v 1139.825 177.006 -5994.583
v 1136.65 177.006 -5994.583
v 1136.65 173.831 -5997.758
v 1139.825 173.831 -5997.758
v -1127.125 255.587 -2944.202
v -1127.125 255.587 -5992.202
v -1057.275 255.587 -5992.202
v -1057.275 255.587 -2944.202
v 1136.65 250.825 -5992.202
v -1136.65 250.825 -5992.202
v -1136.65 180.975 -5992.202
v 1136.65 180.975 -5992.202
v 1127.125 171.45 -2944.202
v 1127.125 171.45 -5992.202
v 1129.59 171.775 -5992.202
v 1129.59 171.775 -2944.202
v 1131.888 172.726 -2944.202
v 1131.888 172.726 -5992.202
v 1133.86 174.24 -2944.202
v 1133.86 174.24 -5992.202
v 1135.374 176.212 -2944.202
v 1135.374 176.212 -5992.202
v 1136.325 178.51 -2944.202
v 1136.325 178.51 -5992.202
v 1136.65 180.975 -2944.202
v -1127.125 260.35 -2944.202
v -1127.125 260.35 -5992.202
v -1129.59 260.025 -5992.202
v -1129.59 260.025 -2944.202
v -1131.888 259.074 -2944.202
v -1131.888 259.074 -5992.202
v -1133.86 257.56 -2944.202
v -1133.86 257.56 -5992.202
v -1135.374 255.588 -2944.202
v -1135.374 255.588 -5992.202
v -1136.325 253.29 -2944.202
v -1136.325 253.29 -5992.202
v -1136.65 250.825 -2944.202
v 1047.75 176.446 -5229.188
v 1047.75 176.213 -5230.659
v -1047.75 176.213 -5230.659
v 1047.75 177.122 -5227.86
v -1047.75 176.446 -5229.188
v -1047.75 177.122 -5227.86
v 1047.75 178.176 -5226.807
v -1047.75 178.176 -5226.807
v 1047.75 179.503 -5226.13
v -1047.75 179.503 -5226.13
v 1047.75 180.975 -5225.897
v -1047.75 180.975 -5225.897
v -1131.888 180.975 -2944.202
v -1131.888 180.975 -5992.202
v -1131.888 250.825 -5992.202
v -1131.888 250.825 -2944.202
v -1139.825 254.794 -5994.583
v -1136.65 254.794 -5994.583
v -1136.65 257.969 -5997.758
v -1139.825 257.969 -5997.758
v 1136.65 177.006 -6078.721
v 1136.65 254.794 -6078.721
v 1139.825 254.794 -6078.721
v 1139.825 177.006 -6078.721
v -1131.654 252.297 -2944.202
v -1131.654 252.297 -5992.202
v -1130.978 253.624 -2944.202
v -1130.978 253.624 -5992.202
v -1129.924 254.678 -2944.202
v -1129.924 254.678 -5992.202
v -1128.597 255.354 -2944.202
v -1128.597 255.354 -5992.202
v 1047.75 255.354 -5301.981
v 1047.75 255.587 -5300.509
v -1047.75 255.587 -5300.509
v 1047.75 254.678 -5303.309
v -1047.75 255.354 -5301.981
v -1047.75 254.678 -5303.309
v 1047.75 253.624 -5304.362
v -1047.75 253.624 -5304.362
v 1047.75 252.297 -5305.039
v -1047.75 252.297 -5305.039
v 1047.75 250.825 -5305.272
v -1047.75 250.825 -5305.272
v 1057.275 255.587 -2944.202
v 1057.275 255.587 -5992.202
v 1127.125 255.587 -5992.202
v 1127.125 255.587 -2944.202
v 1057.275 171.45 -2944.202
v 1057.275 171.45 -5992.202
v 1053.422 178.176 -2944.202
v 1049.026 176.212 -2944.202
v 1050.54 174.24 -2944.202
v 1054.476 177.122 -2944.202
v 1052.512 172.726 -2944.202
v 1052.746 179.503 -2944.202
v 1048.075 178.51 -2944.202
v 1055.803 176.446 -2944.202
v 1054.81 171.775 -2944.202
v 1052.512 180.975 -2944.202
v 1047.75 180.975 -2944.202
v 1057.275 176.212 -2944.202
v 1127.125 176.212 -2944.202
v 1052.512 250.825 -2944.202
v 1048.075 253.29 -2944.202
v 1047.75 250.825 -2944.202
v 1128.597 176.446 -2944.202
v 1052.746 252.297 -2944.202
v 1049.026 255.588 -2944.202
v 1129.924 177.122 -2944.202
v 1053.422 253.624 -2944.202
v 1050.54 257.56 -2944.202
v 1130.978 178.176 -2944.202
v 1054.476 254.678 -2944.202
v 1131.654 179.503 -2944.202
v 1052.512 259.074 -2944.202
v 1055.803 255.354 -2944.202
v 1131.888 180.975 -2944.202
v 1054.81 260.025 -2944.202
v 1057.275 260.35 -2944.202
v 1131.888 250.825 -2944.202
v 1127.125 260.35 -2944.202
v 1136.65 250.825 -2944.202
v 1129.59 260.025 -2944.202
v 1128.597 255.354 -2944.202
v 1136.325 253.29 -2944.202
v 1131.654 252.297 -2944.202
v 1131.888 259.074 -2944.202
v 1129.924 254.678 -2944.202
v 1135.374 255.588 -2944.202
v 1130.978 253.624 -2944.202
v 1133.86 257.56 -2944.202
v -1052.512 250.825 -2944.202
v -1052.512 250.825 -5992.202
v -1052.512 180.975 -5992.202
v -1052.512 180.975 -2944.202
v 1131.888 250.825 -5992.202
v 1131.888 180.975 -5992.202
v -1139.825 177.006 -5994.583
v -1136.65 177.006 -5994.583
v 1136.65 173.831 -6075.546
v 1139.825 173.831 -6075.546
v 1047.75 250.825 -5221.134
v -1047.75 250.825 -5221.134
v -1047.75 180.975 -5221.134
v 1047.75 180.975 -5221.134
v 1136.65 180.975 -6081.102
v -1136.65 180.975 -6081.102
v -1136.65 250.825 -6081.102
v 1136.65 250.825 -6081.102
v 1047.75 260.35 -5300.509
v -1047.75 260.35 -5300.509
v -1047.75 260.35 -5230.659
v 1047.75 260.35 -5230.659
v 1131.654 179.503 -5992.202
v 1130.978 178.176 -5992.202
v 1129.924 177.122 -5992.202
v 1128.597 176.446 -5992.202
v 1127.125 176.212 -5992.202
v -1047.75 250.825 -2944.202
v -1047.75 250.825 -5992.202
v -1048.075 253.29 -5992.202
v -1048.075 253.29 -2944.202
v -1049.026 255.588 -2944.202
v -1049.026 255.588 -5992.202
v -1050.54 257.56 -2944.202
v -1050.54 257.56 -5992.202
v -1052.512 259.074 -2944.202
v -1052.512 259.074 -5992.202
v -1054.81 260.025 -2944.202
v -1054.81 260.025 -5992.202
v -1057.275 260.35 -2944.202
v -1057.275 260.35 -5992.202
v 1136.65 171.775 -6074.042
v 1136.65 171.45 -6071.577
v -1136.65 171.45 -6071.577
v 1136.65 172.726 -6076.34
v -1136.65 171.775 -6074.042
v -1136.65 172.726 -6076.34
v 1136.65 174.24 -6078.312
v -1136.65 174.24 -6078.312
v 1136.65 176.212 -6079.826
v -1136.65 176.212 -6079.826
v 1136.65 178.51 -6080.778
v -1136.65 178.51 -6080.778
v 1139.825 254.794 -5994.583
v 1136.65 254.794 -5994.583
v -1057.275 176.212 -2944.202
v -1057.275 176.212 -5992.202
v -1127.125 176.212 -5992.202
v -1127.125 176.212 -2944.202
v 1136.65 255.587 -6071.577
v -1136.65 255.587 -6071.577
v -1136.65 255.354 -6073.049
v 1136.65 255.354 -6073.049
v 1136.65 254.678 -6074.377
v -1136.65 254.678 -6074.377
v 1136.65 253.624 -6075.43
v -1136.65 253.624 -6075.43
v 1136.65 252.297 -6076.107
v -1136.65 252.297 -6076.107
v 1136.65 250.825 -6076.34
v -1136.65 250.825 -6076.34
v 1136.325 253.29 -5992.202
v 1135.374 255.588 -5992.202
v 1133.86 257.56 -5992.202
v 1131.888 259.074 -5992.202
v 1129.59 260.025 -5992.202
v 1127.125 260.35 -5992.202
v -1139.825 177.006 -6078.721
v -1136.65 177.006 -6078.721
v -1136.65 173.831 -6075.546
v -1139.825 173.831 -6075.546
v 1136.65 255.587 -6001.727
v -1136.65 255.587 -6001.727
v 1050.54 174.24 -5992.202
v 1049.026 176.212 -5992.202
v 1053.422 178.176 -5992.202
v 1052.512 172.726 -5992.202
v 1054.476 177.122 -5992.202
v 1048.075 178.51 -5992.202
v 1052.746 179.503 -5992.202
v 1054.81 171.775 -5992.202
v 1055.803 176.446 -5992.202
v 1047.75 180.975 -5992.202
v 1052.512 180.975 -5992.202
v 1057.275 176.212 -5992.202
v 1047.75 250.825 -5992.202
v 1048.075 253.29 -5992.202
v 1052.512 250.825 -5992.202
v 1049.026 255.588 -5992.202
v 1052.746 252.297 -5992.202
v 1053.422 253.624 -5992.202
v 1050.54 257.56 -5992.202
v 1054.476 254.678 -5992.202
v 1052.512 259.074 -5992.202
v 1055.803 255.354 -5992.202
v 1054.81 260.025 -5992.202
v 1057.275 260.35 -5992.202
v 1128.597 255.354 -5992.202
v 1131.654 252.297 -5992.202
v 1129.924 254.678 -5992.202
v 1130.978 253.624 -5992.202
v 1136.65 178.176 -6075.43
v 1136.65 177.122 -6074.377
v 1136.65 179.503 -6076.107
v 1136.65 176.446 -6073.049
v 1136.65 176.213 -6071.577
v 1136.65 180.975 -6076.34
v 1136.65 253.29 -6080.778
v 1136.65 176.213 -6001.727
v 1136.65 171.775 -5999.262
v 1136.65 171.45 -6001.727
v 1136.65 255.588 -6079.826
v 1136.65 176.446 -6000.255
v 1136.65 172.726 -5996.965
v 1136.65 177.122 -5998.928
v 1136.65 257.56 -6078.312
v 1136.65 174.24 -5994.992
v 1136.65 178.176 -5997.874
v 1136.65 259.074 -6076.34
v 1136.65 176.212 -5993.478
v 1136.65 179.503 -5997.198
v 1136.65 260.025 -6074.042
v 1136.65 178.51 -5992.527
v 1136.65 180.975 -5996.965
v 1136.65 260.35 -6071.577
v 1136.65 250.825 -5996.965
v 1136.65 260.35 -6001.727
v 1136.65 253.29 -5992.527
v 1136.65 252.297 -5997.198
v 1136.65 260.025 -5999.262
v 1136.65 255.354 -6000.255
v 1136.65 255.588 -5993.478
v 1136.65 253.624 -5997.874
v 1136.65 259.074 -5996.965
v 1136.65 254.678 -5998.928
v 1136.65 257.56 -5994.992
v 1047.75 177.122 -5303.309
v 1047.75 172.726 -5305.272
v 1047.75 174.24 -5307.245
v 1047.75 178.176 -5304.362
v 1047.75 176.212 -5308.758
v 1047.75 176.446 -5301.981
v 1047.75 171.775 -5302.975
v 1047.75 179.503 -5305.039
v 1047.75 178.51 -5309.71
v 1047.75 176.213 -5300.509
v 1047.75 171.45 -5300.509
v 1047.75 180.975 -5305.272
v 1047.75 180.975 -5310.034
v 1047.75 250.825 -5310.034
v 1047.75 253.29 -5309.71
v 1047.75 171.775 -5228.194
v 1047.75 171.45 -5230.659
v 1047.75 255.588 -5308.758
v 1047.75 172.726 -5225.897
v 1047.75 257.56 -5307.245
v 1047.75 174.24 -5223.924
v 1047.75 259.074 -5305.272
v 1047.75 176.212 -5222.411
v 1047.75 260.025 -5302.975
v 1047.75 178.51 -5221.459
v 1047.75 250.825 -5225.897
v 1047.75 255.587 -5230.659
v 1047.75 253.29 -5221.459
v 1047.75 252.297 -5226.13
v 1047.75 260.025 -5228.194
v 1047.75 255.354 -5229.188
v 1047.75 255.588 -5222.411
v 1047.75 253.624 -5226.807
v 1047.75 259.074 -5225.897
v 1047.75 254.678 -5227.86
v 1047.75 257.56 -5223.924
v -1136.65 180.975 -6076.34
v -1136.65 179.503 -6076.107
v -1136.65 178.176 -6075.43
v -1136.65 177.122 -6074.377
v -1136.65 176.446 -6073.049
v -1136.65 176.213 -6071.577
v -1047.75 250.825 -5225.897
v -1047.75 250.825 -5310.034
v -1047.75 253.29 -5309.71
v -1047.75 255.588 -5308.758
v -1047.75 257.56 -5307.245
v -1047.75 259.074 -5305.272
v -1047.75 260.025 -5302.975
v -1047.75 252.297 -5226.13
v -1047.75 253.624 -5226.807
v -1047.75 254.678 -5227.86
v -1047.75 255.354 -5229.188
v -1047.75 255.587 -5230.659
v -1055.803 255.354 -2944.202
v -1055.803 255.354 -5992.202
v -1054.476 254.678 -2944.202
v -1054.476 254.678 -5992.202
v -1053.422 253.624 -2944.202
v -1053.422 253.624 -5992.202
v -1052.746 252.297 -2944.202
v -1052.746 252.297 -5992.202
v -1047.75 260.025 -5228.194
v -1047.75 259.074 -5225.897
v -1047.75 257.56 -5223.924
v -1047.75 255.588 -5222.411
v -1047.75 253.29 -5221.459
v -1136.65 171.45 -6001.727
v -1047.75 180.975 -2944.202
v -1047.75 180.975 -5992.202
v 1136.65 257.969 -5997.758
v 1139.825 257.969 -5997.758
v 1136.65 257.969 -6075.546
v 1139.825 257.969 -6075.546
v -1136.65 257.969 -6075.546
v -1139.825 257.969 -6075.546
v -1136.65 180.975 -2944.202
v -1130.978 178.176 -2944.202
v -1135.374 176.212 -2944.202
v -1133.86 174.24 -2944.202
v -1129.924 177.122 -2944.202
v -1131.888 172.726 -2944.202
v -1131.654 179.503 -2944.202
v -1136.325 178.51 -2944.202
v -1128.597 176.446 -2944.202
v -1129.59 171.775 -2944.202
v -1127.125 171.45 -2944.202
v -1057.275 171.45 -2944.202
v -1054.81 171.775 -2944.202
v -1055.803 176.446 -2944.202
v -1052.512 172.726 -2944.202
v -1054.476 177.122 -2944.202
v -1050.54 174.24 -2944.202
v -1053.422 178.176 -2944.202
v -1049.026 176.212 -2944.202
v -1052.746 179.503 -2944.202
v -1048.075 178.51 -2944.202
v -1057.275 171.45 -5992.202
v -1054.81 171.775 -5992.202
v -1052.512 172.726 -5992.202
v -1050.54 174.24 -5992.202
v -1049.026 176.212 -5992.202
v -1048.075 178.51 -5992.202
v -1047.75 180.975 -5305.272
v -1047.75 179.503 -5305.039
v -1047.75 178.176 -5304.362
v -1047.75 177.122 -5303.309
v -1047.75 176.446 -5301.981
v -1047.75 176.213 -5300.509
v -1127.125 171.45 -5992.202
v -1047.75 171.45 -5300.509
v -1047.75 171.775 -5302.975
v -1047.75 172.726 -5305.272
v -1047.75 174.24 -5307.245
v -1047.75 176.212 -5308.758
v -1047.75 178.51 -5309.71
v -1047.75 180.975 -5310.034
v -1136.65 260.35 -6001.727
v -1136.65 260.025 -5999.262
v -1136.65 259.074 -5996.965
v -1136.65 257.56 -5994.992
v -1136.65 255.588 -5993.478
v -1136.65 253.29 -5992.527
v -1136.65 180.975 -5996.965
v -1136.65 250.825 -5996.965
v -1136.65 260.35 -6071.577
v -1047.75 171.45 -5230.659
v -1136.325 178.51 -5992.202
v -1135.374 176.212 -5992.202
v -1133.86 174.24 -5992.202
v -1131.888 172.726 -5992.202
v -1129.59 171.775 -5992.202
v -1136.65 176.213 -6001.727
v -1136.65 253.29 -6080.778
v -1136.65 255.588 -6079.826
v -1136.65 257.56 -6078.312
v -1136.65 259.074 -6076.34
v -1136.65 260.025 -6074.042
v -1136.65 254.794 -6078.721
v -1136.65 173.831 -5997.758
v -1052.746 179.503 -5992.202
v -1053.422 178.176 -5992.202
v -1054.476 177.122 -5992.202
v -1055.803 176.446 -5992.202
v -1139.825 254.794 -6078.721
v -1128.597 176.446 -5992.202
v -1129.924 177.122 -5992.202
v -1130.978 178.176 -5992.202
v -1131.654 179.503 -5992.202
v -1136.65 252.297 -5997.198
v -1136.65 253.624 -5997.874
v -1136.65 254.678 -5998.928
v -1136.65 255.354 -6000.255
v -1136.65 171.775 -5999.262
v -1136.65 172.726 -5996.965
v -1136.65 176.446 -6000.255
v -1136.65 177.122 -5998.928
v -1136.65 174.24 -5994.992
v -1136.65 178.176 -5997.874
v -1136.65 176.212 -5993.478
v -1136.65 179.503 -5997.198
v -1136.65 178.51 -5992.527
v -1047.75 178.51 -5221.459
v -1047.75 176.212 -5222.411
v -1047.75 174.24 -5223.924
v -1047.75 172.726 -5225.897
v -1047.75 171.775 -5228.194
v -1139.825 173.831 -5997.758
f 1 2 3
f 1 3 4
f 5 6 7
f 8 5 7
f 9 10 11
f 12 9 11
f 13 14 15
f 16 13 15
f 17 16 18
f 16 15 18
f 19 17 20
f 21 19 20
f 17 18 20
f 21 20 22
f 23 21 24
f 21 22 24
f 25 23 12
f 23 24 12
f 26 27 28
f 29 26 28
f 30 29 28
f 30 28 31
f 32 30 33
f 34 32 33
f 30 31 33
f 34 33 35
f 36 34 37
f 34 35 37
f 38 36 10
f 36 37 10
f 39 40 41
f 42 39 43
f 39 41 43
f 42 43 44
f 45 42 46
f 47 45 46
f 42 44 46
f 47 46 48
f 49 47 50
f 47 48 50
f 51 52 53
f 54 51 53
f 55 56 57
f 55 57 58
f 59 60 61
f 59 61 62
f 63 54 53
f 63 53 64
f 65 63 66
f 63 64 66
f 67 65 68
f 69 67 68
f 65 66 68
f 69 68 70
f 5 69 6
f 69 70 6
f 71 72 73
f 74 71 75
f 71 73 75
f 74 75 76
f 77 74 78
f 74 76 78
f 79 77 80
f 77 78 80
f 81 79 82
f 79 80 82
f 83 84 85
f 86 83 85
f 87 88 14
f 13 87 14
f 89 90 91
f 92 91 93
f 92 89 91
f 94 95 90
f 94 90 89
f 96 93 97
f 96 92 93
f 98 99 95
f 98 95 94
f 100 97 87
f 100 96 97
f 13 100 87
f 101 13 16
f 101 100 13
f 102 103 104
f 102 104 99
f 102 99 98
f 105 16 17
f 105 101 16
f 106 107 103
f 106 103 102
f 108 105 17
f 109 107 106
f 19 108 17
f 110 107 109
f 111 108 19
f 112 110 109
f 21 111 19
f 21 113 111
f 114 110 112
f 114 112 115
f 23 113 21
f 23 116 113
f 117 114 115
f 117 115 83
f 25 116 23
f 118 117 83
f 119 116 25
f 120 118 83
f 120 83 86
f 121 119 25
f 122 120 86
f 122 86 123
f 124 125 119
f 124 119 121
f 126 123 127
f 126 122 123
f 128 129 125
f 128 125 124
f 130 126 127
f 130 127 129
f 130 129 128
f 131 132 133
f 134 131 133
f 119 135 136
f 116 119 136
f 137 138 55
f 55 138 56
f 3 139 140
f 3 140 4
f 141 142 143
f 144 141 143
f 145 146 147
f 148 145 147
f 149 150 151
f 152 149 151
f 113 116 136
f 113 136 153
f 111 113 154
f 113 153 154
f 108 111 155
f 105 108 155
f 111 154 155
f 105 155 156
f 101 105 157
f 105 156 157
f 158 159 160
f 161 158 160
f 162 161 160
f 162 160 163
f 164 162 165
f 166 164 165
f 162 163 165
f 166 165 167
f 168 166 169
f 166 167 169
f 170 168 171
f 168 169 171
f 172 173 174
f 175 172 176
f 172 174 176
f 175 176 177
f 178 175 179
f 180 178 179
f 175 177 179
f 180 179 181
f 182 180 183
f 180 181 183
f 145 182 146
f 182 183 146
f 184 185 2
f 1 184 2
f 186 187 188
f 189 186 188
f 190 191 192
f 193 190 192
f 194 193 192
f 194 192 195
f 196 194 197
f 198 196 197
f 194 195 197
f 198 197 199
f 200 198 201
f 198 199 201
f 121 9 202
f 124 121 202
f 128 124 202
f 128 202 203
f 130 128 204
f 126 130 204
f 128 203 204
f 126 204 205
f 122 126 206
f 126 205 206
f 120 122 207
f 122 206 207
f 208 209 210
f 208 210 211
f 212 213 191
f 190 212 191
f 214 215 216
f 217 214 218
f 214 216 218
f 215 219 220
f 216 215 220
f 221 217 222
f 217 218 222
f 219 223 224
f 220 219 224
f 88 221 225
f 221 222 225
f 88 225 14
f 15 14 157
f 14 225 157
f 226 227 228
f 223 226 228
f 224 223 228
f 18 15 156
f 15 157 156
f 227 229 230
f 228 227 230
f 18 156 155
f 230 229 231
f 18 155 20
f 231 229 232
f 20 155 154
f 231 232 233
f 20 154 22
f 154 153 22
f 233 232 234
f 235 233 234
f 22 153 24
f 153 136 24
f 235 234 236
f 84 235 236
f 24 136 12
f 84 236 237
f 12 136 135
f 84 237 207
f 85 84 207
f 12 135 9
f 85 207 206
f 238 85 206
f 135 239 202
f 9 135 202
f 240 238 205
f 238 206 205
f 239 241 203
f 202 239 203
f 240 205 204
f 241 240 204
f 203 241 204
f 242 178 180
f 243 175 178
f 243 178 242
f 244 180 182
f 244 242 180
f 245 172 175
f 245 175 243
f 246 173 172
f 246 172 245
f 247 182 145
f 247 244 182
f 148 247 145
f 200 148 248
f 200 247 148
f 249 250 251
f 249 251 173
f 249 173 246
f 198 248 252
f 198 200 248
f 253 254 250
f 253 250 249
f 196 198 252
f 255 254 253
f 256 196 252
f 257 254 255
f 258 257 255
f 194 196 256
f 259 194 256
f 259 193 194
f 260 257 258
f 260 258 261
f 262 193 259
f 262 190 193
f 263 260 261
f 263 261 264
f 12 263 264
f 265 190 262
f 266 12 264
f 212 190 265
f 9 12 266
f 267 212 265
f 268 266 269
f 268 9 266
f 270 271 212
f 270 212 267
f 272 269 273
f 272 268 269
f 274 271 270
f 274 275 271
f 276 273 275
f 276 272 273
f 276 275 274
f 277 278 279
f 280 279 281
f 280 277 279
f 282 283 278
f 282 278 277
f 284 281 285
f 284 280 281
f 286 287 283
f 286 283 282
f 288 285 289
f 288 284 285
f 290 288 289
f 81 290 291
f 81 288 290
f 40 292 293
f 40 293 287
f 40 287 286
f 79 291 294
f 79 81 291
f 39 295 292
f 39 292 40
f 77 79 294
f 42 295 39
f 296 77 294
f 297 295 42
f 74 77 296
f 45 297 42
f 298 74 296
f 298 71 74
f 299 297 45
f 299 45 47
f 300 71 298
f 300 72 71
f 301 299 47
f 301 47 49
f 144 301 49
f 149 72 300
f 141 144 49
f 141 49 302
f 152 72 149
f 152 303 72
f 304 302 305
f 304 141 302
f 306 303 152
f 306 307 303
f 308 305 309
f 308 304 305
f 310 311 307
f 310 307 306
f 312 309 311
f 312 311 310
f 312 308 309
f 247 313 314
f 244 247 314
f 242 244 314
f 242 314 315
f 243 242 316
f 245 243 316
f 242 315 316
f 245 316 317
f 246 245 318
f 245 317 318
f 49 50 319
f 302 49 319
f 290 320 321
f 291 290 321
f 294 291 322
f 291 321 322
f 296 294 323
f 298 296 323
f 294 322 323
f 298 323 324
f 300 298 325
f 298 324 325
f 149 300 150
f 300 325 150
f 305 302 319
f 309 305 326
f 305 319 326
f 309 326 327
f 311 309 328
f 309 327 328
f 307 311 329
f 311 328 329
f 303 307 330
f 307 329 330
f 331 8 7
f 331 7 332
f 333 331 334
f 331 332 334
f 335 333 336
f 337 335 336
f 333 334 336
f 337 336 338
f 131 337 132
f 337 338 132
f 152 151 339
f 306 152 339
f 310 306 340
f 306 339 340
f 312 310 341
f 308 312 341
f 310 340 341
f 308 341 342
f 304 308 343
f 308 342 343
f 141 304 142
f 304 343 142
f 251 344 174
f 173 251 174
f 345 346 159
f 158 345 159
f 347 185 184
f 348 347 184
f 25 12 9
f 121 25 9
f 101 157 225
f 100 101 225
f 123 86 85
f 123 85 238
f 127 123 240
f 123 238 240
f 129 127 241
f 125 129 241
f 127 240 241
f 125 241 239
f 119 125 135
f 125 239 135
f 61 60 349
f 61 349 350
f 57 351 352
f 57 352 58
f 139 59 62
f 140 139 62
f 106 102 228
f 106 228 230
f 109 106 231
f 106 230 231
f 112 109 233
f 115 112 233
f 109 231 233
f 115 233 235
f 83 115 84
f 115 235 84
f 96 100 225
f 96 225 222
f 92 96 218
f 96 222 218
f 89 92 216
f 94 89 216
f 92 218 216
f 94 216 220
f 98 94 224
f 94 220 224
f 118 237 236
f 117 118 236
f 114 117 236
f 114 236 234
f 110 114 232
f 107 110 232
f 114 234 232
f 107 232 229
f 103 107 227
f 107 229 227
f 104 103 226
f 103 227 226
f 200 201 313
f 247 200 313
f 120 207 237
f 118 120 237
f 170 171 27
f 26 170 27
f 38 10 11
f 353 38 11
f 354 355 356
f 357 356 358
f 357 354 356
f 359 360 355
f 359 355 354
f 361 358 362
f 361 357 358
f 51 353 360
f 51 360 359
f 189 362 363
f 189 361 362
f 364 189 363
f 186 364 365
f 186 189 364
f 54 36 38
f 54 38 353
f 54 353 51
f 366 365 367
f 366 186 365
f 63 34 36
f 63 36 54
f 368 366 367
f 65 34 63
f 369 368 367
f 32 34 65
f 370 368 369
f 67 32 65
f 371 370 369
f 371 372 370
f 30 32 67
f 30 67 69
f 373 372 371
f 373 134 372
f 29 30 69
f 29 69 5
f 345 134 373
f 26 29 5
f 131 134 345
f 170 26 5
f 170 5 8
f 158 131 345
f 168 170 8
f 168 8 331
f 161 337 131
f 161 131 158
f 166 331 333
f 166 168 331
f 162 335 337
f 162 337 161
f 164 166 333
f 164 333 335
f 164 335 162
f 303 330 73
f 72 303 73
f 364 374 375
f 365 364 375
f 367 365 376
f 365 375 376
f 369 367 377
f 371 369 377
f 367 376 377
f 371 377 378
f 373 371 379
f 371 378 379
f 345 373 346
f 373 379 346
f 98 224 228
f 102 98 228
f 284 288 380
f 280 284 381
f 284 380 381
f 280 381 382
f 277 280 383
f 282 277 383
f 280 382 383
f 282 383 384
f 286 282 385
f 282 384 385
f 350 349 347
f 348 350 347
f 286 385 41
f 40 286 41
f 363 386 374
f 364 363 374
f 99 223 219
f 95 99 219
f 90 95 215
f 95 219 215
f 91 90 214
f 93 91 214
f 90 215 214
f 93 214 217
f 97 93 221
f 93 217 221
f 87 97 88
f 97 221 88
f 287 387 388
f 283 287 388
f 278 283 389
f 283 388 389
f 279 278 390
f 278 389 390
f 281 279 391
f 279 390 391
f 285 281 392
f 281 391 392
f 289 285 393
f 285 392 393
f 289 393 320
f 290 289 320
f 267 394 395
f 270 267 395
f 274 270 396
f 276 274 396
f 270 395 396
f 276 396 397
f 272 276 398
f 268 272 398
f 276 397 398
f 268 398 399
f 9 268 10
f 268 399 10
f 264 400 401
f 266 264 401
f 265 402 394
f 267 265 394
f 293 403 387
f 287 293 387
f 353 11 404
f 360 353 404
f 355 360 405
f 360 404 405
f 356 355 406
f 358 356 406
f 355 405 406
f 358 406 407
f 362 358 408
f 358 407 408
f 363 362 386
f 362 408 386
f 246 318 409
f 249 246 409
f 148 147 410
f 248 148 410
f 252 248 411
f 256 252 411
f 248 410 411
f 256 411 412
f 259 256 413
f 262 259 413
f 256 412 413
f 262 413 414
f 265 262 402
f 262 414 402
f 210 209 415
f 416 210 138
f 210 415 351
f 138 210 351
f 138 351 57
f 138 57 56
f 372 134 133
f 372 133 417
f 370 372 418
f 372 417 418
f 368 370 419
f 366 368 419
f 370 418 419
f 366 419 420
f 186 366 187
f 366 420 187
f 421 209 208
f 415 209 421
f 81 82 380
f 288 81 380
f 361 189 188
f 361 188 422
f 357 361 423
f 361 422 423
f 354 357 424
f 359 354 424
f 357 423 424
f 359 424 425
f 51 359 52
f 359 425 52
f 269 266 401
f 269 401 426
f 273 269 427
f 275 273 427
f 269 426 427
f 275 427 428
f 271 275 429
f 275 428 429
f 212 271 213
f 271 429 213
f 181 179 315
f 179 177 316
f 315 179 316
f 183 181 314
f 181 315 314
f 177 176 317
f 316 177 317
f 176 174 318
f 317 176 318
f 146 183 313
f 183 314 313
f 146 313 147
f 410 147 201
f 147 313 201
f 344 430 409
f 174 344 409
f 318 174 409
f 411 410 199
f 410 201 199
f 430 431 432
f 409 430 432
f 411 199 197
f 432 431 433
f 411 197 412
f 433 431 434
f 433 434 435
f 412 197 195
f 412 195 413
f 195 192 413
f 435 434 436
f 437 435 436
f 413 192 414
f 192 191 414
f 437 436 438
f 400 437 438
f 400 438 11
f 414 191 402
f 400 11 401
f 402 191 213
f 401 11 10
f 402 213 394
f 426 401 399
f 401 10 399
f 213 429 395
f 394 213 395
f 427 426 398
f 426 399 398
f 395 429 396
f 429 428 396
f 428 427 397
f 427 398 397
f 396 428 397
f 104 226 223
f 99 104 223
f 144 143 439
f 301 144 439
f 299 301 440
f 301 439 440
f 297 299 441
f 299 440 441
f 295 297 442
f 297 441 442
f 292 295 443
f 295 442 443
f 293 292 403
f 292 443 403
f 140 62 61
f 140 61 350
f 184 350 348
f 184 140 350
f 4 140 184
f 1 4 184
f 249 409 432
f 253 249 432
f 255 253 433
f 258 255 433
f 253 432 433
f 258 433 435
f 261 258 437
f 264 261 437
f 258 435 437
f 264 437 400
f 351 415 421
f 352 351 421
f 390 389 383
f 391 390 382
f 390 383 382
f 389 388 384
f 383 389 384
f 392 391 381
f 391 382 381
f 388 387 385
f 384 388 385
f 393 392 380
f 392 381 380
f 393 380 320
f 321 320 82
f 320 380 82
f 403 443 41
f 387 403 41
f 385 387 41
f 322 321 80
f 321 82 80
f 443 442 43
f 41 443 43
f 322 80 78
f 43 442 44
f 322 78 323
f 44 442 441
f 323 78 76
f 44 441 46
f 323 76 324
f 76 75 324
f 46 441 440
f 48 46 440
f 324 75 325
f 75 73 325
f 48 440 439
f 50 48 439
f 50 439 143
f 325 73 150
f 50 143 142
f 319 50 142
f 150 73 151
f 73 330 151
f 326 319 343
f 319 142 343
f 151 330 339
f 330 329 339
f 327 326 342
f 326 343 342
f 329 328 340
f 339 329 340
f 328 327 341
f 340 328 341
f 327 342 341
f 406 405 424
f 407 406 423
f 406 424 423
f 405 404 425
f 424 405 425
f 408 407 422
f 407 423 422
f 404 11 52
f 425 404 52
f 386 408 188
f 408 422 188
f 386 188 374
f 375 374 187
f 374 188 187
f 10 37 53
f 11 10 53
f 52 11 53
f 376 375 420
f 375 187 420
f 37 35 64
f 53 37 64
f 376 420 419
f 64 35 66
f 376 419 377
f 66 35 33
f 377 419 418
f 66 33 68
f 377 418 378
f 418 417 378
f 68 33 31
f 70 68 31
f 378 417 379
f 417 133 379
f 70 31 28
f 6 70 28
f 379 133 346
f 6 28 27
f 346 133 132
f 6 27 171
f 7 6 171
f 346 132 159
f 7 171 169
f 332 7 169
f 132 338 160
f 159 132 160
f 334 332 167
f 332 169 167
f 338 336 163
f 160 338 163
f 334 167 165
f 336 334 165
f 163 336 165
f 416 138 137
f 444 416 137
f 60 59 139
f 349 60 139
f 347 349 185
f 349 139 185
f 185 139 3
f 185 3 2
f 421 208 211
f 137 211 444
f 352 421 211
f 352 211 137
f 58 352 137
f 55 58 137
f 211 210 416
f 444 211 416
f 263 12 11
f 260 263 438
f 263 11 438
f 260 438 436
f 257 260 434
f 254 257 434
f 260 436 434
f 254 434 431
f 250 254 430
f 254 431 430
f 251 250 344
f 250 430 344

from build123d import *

# Parameters (mm, degrees)
EXTENSION_START          = -1047.75
EXTENSION_MIDDLE_DEPTH   = 2095.5
EXTENSION_START_2        = -1136.65
EXTENSION_MIDDLE_2_DEPTH = 2273.3
EXTENSION_START_3        = -5992.202181603
EXTENSION_MIDDLE_3_DEPTH = 3048
END_CAPS_WIDTH           = 84.1375
END_CAPS_HEIGHT          = 84.1375
END_CAPS_THICKNESS       = 3.175
END_CAPS_2_SIZE          = 3.175
END_CAPS_4_WIDTH         = 84.1375
END_CAPS_4_HEIGHT        = 84.1375
END_CAPS_4_THICKNESS     = 3.175
END_CAPS_5_SIZE          = 3.175


# Read off the part's stored shape, not the designer's step: extension middle
with BuildPart() as part:
    # extension middle outline → extension middle (new body)
    # profile 1 of 2: a face of its own
    with BuildSketch(Plane.YZ.offset(EXTENSION_START)):
        with BuildLine():
            ThreePointArc((250.825, -6081.102181603), (257.560192091, -6078.312373694), (260.35, -6071.577181603))
            Line((260.35, -6071.577181603), (260.35, -6001.727181603))
            ThreePointArc((260.35, -6001.727181603), (257.560192091, -5994.991989512), (250.825, -5992.202181603))
            Line((250.825, -5992.202181603), (180.975, -5992.202181603))
            ThreePointArc((180.975, -5992.202181603), (174.239807909, -5994.991989512), (171.45, -6001.727181603))
            Line((171.45, -6001.727181603), (171.45, -6071.577181603))
            ThreePointArc((171.45, -6071.577181603), (174.239807909, -6078.312373694), (180.975, -6081.102181603))
            Line((180.975, -6081.102181603), (250.825, -6081.102181603))
        make_face()
        with BuildLine():
            Line((180.975, -5996.964681603), (250.825, -5996.964681603))
            ThreePointArc((250.825, -5996.964681603), (254.192596045, -5998.359585558), (255.5875, -6001.727181603))
            Line((255.5875, -6001.727181603), (255.5875, -6071.577181603))
            ThreePointArc((255.5875, -6071.577181603), (254.192596045, -6074.944777649), (250.825, -6076.339681603))
            Line((250.825, -6076.339681603), (180.975, -6076.339681603))
            ThreePointArc((180.975, -6076.339681603), (177.607403955, -6074.944777649), (176.2125, -6071.577181603))
            Line((176.2125, -6071.577181603), (176.2125, -6001.727181603))
            ThreePointArc((176.2125, -6001.727181603), (177.607403955, -5998.359585558), (180.975, -5996.964681603))
        make_face(mode=Mode.SUBTRACT)
    # profile 2 of 2: a face of its own
    with BuildSketch(Plane.YZ.offset(EXTENSION_START)):
        with BuildLine():
            Line((180.975, -5310.034488622), (250.825, -5310.034488622))
            ThreePointArc((250.825, -5310.034488622), (257.560192091, -5307.244680713), (260.35, -5300.509488622))
            Line((260.35, -5300.509488622), (260.35, -5230.659488622))
            ThreePointArc((260.35, -5230.659488622), (257.560192091, -5223.924296531), (250.825, -5221.134488622))
            Line((250.825, -5221.134488622), (180.975, -5221.134488622))
            ThreePointArc((180.975, -5221.134488622), (174.239807909, -5223.924296531), (171.45, -5230.659488622))
            Line((171.45, -5230.659488622), (171.45, -5300.509488622))
            ThreePointArc((171.45, -5300.509488622), (174.239807909, -5307.244680713), (180.975, -5310.034488622))
        make_face()
        with BuildLine():
            ThreePointArc((176.2125, -5230.659488622), (177.607403955, -5227.291892577), (180.975, -5225.896988622))
            Line((180.975, -5225.896988622), (250.825, -5225.896988622))
            ThreePointArc((250.825, -5225.896988622), (254.192596045, -5227.291892577), (255.5875, -5230.659488622))
            Line((255.5875, -5230.659488622), (255.5875, -5300.509488622))
            ThreePointArc((255.5875, -5300.509488622), (254.192596045, -5303.877084667), (250.825, -5305.271988622))
            Line((250.825, -5305.271988622), (180.975, -5305.271988622))
            ThreePointArc((180.975, -5305.271988622), (177.607403955, -5303.877084667), (176.2125, -5300.509488622))
            Line((176.2125, -5300.509488622), (176.2125, -5230.659488622))
        make_face(mode=Mode.SUBTRACT)
    extrude(amount=EXTENSION_MIDDLE_DEPTH)

    # extension middle 2 outline → extension middle 2 (add)
    with BuildSketch(Plane.YZ.offset(EXTENSION_START_2)):
        with BuildLine():
            ThreePointArc((250.825, -6081.102181603), (257.560192091, -6078.312373694), (260.35, -6071.577181603))
            Line((260.35, -6071.577181603), (260.35, -6001.727181603))
            ThreePointArc((260.35, -6001.727181603), (257.560192091, -5994.991989512), (250.825, -5992.202181603))
            Line((250.825, -5992.202181603), (180.975, -5992.202181603))
            ThreePointArc((180.975, -5992.202181603), (174.239807909, -5994.991989512), (171.45, -6001.727181603))
            Line((171.45, -6001.727181603), (171.45, -6071.577181603))
            ThreePointArc((171.45, -6071.577181603), (174.239807909, -6078.312373694), (180.975, -6081.102181603))
            Line((180.975, -6081.102181603), (250.825, -6081.102181603))
        make_face()
        with BuildLine():
            Line((180.975, -5996.964681603), (250.825, -5996.964681603))
            ThreePointArc((250.825, -5996.964681603), (254.192596045, -5998.359585558), (255.5875, -6001.727181603))
            Line((255.5875, -6001.727181603), (255.5875, -6071.577181603))
            ThreePointArc((255.5875, -6071.577181603), (254.192596045, -6074.944777649), (250.825, -6076.339681603))
            Line((250.825, -6076.339681603), (180.975, -6076.339681603))
            ThreePointArc((180.975, -6076.339681603), (177.607403955, -6074.944777649), (176.2125, -6071.577181603))
            Line((176.2125, -6071.577181603), (176.2125, -6001.727181603))
            ThreePointArc((176.2125, -6001.727181603), (177.607403955, -5998.359585558), (180.975, -5996.964681603))
        make_face(mode=Mode.SUBTRACT)
    extrude(amount=EXTENSION_MIDDLE_2_DEPTH)


with BuildPart() as body_2:
    # extension middle 3 outline → extension middle 3 (new body)
    # profile 1 of 2: a face of its own
    with BuildSketch(Plane.XY.offset(EXTENSION_START_3)):
        with BuildLine():
            Line((1136.65, 180.975), (1136.65, 250.825))
            ThreePointArc((1136.65, 250.825), (1133.860192091, 257.560192091), (1127.125, 260.35))
            Line((1127.125, 260.35), (1057.275, 260.35))
            ThreePointArc((1057.275, 260.35), (1050.539807909, 257.560192091), (1047.75, 250.825))
            Line((1047.75, 250.825), (1047.75, 180.975))
            ThreePointArc((1047.75, 180.975), (1050.539807909, 174.239807909), (1057.275, 171.45))
            Line((1057.275, 171.45), (1127.125, 171.45))
            ThreePointArc((1127.125, 171.45), (1133.860192091, 174.239807909), (1136.65, 180.975))
        make_face()
        with BuildLine():
            ThreePointArc((1057.275, 176.2125), (1053.907403955, 177.607403955), (1052.5125, 180.975))
            Line((1052.5125, 180.975), (1052.5125, 250.825))
            ThreePointArc((1052.5125, 250.825), (1053.907403955, 254.192596045), (1057.275, 255.5875))
            Line((1057.275, 255.5875), (1127.125, 255.5875))
            ThreePointArc((1127.125, 255.5875), (1130.492596045, 254.192596045), (1131.8875, 250.825))
            Line((1131.8875, 250.825), (1131.8875, 180.975))
            ThreePointArc((1131.8875, 180.975), (1130.492596045, 177.607403955), (1127.125, 176.2125))
            Line((1127.125, 176.2125), (1057.275, 176.2125))
        make_face(mode=Mode.SUBTRACT)
    # profile 2 of 2: a face of its own
    with BuildSketch(Plane.XY.offset(EXTENSION_START_3)):
        with BuildLine():
            Line((-1047.75, 180.975), (-1047.75, 250.825))
            ThreePointArc((-1047.75, 250.825), (-1050.539807909, 257.560192091), (-1057.275, 260.35))
            Line((-1057.275, 260.35), (-1127.125, 260.35))
            ThreePointArc((-1127.125, 260.35), (-1133.860192091, 257.560192091), (-1136.65, 250.825))
            Line((-1136.65, 250.825), (-1136.65, 180.975))
            ThreePointArc((-1136.65, 180.975), (-1133.860192091, 174.239807909), (-1127.125, 171.45))
            Line((-1127.125, 171.45), (-1057.275, 171.45))
            ThreePointArc((-1057.275, 171.45), (-1050.539807909, 174.239807909), (-1047.75, 180.975))
        make_face()
        with BuildLine():
            ThreePointArc((-1127.125, 176.2125), (-1130.492596045, 177.607403955), (-1131.8875, 180.975))
            Line((-1131.8875, 180.975), (-1131.8875, 250.825))
            ThreePointArc((-1131.8875, 250.825), (-1130.492596045, 254.192596045), (-1127.125, 255.5875))
            Line((-1127.125, 255.5875), (-1057.275, 255.5875))
            ThreePointArc((-1057.275, 255.5875), (-1053.907403955, 254.192596045), (-1052.5125, 250.825))
            Line((-1052.5125, 250.825), (-1052.5125, 180.975))
            ThreePointArc((-1052.5125, 180.975), (-1053.907403955, 177.607403955), (-1057.275, 176.2125))
            Line((-1057.275, 176.2125), (-1127.125, 176.2125))
        make_face(mode=Mode.SUBTRACT)
    extrude(amount=EXTENSION_MIDDLE_3_DEPTH)


with BuildPart() as body_3:
    # end_caps: an end cap: a rectangular plate 3.175 thick over the member's open end
    with BuildSketch(Plane(origin=(1136.65, 215.9, -6036.652181603), x_dir=(0, 0, 1), z_dir=(1, 0, 0))):
        Rectangle(END_CAPS_WIDTH, END_CAPS_HEIGHT)
    extrude(amount=END_CAPS_THICKNESS)

    # end_caps 2
    end_caps_2_edges = [body_3.edges().sort_by_distance(p)[0] for p in [
        (1138.2375, 257.96875, -6078.720931603),
        (1138.2375, 173.83125, -6078.720931603),
        (1138.2375, 257.96875, -5994.583431603),
        (1138.2375, 173.83125, -5994.583431603),
    ]]
    chamfer(end_caps_2_edges, length=END_CAPS_2_SIZE)


with BuildPart() as body_4:
    # end_caps 4: an end cap: a rectangular plate 3.175 thick over the member's open end
    with BuildSketch(Plane(origin=(-1136.65, 215.9, -6036.652181603), x_dir=(0, 0, 1), z_dir=(-1, 0, 0))):
        Rectangle(END_CAPS_4_WIDTH, END_CAPS_4_HEIGHT)
    extrude(amount=END_CAPS_4_THICKNESS)

    # end_caps 5
    end_caps_5_edges = [body_4.edges().sort_by_distance(p)[0] for p in [
        (-1138.2375, 173.83125, -6078.720931603),
        (-1138.2375, 257.96875, -6078.720931603),
        (-1138.2375, 173.83125, -5994.583431603),
        (-1138.2375, 257.96875, -5994.583431603),
    ]]
    chamfer(end_caps_5_edges, length=END_CAPS_5_SIZE)


solid = Compound([part.part, body_2.part, body_3.part, body_4.part])
